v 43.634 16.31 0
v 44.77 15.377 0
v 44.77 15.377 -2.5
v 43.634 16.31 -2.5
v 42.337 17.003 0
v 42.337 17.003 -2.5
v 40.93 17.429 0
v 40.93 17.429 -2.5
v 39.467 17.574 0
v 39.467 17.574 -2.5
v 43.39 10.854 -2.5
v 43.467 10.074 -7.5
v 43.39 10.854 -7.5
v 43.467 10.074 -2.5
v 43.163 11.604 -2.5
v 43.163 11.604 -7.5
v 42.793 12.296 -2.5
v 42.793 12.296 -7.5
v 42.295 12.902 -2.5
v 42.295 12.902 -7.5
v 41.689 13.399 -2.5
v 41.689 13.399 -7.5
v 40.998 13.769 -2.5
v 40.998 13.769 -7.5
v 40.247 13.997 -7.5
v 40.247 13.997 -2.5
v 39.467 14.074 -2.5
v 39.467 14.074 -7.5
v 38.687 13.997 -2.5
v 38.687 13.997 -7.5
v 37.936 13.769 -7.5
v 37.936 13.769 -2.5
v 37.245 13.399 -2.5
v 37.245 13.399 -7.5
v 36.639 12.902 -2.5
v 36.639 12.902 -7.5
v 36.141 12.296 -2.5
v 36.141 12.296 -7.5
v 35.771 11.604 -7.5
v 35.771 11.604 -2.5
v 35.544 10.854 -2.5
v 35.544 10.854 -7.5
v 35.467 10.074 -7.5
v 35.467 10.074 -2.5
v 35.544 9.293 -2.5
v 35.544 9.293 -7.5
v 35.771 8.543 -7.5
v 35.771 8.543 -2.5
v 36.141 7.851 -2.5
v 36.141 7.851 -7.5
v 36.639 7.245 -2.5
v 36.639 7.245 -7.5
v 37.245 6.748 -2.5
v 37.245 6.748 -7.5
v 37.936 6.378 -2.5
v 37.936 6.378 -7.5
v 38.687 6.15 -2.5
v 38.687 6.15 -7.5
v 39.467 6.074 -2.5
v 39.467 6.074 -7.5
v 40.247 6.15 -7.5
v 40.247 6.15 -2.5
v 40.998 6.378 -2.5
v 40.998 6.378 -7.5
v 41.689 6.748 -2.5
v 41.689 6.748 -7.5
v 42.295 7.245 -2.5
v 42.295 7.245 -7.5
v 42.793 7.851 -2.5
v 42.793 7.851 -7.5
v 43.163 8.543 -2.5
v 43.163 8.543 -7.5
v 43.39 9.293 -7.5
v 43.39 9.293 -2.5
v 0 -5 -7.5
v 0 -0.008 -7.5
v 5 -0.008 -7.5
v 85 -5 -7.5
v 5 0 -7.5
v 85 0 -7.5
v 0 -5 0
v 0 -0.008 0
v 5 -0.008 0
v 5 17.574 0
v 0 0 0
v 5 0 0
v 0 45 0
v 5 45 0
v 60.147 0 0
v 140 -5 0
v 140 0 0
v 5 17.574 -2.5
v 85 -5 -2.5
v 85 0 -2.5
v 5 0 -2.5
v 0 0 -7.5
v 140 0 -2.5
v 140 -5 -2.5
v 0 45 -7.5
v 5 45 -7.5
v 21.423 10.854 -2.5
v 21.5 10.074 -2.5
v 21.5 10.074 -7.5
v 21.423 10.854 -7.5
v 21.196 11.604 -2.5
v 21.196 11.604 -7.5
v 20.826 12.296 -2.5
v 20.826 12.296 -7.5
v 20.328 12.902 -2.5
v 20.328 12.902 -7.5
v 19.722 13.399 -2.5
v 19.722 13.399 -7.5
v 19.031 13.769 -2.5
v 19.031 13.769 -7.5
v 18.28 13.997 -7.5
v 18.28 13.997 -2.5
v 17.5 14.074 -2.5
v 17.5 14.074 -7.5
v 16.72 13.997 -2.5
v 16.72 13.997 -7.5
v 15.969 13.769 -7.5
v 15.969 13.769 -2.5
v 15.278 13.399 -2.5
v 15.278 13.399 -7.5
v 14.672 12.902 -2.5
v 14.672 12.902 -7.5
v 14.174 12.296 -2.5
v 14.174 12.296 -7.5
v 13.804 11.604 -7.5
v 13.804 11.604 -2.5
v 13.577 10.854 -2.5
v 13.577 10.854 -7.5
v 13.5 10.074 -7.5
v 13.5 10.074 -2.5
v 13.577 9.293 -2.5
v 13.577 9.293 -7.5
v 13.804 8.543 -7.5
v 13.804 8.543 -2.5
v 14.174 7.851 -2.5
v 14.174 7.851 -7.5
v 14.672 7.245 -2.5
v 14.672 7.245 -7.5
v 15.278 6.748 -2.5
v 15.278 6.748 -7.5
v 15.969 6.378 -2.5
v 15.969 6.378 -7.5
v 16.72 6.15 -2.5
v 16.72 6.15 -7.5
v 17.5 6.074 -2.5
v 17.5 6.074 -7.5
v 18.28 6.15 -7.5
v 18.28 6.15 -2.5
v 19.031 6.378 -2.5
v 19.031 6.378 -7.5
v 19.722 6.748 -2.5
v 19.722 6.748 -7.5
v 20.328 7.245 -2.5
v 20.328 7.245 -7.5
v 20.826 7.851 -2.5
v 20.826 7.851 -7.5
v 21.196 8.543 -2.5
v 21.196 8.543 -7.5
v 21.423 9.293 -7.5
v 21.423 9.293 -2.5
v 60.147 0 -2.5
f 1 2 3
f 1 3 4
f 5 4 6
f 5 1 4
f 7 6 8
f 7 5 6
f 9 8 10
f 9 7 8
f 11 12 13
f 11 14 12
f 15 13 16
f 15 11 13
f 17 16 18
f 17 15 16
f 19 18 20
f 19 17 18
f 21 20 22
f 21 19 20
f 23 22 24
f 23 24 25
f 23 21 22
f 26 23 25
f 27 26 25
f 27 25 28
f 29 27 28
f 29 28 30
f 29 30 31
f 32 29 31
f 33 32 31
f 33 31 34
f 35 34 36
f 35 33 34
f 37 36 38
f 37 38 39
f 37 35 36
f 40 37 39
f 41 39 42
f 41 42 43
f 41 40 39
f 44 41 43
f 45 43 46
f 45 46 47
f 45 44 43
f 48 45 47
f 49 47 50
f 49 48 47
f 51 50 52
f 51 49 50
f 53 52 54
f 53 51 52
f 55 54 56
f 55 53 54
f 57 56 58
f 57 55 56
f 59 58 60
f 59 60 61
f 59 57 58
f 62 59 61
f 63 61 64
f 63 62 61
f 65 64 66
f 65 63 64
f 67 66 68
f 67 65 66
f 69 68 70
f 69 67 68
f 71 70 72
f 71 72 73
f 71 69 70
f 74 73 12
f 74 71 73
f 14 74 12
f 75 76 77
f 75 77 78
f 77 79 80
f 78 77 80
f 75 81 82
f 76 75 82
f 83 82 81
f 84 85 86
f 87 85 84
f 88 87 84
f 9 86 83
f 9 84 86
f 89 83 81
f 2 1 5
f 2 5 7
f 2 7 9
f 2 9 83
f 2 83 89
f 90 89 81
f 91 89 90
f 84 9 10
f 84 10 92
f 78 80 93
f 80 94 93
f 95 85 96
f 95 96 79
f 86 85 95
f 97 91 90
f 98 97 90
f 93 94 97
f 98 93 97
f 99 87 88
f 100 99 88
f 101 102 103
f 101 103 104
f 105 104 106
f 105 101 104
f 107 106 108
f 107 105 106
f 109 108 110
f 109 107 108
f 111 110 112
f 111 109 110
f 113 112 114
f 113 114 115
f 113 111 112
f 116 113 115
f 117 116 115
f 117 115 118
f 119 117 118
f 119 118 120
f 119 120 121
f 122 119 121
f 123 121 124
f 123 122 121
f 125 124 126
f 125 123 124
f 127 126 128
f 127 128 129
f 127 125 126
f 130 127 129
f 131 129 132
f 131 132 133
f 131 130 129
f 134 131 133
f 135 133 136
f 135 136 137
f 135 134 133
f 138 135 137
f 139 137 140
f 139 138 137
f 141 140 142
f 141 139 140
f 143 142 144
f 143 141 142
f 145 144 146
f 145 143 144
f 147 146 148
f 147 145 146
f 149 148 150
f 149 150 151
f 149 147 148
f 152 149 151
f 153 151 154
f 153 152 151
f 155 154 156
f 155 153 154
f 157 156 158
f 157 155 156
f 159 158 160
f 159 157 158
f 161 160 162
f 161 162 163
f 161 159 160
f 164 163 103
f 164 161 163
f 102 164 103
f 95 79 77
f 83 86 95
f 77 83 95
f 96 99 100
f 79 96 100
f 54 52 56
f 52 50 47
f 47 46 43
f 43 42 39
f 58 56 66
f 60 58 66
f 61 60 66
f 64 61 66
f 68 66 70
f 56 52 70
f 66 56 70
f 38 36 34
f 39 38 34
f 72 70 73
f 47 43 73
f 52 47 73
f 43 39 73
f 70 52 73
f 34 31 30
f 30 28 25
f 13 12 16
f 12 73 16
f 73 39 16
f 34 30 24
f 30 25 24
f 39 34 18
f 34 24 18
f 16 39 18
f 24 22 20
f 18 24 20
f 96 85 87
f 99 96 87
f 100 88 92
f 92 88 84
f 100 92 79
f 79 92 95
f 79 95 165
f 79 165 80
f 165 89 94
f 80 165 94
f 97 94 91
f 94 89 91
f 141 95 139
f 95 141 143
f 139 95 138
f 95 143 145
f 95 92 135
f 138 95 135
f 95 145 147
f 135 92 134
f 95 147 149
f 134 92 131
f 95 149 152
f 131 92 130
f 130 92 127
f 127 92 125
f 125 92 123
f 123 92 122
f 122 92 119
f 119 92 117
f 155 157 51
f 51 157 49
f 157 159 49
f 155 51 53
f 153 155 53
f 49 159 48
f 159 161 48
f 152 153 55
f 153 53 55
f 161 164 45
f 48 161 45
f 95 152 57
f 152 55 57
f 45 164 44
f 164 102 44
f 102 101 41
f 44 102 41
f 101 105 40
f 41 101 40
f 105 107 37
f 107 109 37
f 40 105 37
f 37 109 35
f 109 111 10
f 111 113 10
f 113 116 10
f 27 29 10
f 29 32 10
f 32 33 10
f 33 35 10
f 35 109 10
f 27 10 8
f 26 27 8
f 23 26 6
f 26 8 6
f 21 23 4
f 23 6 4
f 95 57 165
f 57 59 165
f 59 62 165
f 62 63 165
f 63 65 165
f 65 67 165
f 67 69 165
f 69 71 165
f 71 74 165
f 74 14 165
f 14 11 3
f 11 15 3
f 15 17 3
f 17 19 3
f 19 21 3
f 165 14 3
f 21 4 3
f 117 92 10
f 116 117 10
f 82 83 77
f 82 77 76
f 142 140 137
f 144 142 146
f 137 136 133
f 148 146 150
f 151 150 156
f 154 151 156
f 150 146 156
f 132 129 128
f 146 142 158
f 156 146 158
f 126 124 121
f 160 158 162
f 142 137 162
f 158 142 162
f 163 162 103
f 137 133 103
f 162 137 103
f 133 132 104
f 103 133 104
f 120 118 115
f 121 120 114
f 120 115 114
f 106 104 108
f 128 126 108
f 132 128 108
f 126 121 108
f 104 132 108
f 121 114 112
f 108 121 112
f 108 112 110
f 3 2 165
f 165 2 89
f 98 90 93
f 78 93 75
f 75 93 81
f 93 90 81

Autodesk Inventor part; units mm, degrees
ref_plane "YZ Plane" through (0, 0, 0) normal (1, 0, 0) x (0, 1, 0)
ref_plane "XZ Plane" through (0, 0, 0) normal (0, 1, 0) x (-1, 0, 0)
ref_plane "XY Plane" through (0, 0, 0) normal (0, 0, 1) x (1, 0, 0)
sketch "Sketch1" plane through (0, 0, 0) normal (0, 0, 1) x (1, 0, 0)
  line L0 (0, 0) -> (140, 0)
  line L1 (140, 0) -> (140, 60) construction
  line L2 (140, 60) -> (0, 60) construction
  line L3 (0, 60) -> (0, 0) construction
  line L4 (0, 45) -> (15, 60)
  line L5 (0, 45) -> (21.2132, 45) construction
  line L6 (0, 45) -> (140, 45) construction
  line L7 (140, 45) -> (125, 60)
  line L8 (140, 45) -> (161.2132, 45) construction
  line L9 (0, 0) -> (0, 45)
  line L10 (140, 0) -> (140, 45)
  line L11 (125, 60) -> (15, 60)
  line L12 (0, 0) -> (140, 0)
  line L13 (140, 0) -> (140, 5)
  line L14 (140, 5) -> (0, 5) construction
  line L15 (0, 5) -> (0, 0)
  line L16 (0, 0) -> (5, 0)
  line L17 (5, 0) -> (5, 50) construction
  line L18 (5, 50) -> (0, 50) construction
  line L19 (0, 50) -> (0, 0) construction
  line L20 (140, 0) -> (135, 0) construction
  line L21 (135, 0) -> (135, 50) construction
  line L22 (135, 50) -> (140, 50) construction
  line L23 (140, 50) -> (140, 0) construction
  line L24 (0, 45) -> (30, 45)
  line L25 (140, 45) -> (30, 45)
  line L26 (85, 45) -> (100, 60)
  line L27 (140, 45) -> (34.9105, 45)
  line L28 (34.9105, 0) -> (140, 0)
  line L29 (140, 0) -> (140, 45)
  line L30 (0, 0) -> (10, 0)
  line L31 (10, 0) -> (10, 45) construction
  line L32 (10, 45) -> (0, 45)
  line L33 (0, 45) -> (0, 0)
  line L34 (10, 5) -> (25.8293, 5) construction
  circle A0 centre (81.8934, 52.5) radius 7.5 construction
  line L35 (81.8934, 52.5) -> (39.467, 10.0736) construction
  line L36 (81.8934, 52.5) -> (141.8934, 52.5) construction
  circle A1 centre (39.467, 10.0736) radius 7.5
  circle A2 centre (17.5, 10.0736) radius 7.5
  line L37 (17.5, 10.0736) -> (39.467, 10.0736) construction
  line L38 (17.5, 10.0736) -> (59.9264, 52.5) construction
  line L39 (17.5, 10.0736) -> (77.5, 10.0736) construction
  circle A3 centre (59.9264, 52.5) radius 7.5 construction
  line L40 (59.9264, 52.5) -> (81.8934, 52.5) construction
  circle A4 centre (52.4264, 45) radius 7.5 construction
  circle A5 centre (74.3934, 45) radius 7.5 construction
  line L41 (12.1967, 15.3769) -> (47.1231, 50.3033) construction
  line L42 (57.7297, 39.6967) -> (22.8033, 4.7703) construction
  line L43 (34.1637, 15.3769) -> (69.0901, 50.3033) construction
  line L44 (79.6967, 39.6967) -> (44.7703, 4.7703) construction
  circle A6 centre (52.4264, 45) radius 8
  circle A7 centre (74.3934, 45) radius 8
  line L45 (52.4264, 45) -> (74.3934, 45)
  line L46 (46.7696, 50.6569) -> (41.1127, 45)
  line L47 (46.7696, 50.6569) -> (54.7696, 50.6569) construction
  line L48 (79.0022, 38.461) -> (36.7044, 38.461) construction
  line L49 (52.4264, 53) -> (93, 53)
  circle A8 centre (17.5, 10.0736) radius 4
  circle A9 centre (39.467, 10.0736) radius 4
  line L50 (0, 0) -> (140, 0)
  line L51 (140, 0) -> (140, -5)
  line L52 (140, -5) -> (0, -5)
  line L53 (0, -5) -> (0, 0)
  line L54 (0, 45) -> (5, 45)
  line L55 (5, 45) -> (5, -0.0081)
  line L56 (5, -0.0081) -> (0, -0.0081)
  line L57 (0, -0.0081) -> (0, 45)
  line L58 (17.5, 17.5736) -> (5, 17.5736)
  line L59 (44.7703, 15.3769) -> (60.1472, 0)
  line L60 (39.467, 17.5736) -> (17.5, 17.5736)
  line L61 (85, 45) -> (85, 0)
  line L62 (85, 0) -> (85, -5)
  point P0 (43.467, 0)
  dimension "d19" = 16
  dimension "d0" = 140
  dimension "d1" = 60
  dimension "d2" = 45
  dimension "d3" = 15
  dimension "d4" = 135
  dimension "d5" = 5
  dimension "d6" = 5
  dimension "d7" = 5
  dimension "d8" = 25
  dimension "d9" = 10
  dimension "d10" = 60
  dimension "d11" = 135
  dimension "d12" = 15
  dimension "d13" = 15
  dimension "d14" = 60
  dimension "d15" = 45
  dimension "d16" = 15
  dimension "d17" = 15
  dimension "d18" = 16
  dimension "d20" = 135
  dimension "d21" = 8
  dimension "d22" = 8
  dimension "d23" = 5
  dimension "d24" = 5
extrude "Extrusion1" add sketch "Sketch1" against normal blind 7.5 contours L9 L24 L55 L0 | L0 L62 L52 L53 L56 L55 | A8 | A9
extrude "Extrusion2" add sketch "Sketch1" against normal blind 2.5 contours A2 | L55 L58 L60 A1 L59 L0 | L62 L0 L51 L52 | A1
properties part number "Basseipt"
